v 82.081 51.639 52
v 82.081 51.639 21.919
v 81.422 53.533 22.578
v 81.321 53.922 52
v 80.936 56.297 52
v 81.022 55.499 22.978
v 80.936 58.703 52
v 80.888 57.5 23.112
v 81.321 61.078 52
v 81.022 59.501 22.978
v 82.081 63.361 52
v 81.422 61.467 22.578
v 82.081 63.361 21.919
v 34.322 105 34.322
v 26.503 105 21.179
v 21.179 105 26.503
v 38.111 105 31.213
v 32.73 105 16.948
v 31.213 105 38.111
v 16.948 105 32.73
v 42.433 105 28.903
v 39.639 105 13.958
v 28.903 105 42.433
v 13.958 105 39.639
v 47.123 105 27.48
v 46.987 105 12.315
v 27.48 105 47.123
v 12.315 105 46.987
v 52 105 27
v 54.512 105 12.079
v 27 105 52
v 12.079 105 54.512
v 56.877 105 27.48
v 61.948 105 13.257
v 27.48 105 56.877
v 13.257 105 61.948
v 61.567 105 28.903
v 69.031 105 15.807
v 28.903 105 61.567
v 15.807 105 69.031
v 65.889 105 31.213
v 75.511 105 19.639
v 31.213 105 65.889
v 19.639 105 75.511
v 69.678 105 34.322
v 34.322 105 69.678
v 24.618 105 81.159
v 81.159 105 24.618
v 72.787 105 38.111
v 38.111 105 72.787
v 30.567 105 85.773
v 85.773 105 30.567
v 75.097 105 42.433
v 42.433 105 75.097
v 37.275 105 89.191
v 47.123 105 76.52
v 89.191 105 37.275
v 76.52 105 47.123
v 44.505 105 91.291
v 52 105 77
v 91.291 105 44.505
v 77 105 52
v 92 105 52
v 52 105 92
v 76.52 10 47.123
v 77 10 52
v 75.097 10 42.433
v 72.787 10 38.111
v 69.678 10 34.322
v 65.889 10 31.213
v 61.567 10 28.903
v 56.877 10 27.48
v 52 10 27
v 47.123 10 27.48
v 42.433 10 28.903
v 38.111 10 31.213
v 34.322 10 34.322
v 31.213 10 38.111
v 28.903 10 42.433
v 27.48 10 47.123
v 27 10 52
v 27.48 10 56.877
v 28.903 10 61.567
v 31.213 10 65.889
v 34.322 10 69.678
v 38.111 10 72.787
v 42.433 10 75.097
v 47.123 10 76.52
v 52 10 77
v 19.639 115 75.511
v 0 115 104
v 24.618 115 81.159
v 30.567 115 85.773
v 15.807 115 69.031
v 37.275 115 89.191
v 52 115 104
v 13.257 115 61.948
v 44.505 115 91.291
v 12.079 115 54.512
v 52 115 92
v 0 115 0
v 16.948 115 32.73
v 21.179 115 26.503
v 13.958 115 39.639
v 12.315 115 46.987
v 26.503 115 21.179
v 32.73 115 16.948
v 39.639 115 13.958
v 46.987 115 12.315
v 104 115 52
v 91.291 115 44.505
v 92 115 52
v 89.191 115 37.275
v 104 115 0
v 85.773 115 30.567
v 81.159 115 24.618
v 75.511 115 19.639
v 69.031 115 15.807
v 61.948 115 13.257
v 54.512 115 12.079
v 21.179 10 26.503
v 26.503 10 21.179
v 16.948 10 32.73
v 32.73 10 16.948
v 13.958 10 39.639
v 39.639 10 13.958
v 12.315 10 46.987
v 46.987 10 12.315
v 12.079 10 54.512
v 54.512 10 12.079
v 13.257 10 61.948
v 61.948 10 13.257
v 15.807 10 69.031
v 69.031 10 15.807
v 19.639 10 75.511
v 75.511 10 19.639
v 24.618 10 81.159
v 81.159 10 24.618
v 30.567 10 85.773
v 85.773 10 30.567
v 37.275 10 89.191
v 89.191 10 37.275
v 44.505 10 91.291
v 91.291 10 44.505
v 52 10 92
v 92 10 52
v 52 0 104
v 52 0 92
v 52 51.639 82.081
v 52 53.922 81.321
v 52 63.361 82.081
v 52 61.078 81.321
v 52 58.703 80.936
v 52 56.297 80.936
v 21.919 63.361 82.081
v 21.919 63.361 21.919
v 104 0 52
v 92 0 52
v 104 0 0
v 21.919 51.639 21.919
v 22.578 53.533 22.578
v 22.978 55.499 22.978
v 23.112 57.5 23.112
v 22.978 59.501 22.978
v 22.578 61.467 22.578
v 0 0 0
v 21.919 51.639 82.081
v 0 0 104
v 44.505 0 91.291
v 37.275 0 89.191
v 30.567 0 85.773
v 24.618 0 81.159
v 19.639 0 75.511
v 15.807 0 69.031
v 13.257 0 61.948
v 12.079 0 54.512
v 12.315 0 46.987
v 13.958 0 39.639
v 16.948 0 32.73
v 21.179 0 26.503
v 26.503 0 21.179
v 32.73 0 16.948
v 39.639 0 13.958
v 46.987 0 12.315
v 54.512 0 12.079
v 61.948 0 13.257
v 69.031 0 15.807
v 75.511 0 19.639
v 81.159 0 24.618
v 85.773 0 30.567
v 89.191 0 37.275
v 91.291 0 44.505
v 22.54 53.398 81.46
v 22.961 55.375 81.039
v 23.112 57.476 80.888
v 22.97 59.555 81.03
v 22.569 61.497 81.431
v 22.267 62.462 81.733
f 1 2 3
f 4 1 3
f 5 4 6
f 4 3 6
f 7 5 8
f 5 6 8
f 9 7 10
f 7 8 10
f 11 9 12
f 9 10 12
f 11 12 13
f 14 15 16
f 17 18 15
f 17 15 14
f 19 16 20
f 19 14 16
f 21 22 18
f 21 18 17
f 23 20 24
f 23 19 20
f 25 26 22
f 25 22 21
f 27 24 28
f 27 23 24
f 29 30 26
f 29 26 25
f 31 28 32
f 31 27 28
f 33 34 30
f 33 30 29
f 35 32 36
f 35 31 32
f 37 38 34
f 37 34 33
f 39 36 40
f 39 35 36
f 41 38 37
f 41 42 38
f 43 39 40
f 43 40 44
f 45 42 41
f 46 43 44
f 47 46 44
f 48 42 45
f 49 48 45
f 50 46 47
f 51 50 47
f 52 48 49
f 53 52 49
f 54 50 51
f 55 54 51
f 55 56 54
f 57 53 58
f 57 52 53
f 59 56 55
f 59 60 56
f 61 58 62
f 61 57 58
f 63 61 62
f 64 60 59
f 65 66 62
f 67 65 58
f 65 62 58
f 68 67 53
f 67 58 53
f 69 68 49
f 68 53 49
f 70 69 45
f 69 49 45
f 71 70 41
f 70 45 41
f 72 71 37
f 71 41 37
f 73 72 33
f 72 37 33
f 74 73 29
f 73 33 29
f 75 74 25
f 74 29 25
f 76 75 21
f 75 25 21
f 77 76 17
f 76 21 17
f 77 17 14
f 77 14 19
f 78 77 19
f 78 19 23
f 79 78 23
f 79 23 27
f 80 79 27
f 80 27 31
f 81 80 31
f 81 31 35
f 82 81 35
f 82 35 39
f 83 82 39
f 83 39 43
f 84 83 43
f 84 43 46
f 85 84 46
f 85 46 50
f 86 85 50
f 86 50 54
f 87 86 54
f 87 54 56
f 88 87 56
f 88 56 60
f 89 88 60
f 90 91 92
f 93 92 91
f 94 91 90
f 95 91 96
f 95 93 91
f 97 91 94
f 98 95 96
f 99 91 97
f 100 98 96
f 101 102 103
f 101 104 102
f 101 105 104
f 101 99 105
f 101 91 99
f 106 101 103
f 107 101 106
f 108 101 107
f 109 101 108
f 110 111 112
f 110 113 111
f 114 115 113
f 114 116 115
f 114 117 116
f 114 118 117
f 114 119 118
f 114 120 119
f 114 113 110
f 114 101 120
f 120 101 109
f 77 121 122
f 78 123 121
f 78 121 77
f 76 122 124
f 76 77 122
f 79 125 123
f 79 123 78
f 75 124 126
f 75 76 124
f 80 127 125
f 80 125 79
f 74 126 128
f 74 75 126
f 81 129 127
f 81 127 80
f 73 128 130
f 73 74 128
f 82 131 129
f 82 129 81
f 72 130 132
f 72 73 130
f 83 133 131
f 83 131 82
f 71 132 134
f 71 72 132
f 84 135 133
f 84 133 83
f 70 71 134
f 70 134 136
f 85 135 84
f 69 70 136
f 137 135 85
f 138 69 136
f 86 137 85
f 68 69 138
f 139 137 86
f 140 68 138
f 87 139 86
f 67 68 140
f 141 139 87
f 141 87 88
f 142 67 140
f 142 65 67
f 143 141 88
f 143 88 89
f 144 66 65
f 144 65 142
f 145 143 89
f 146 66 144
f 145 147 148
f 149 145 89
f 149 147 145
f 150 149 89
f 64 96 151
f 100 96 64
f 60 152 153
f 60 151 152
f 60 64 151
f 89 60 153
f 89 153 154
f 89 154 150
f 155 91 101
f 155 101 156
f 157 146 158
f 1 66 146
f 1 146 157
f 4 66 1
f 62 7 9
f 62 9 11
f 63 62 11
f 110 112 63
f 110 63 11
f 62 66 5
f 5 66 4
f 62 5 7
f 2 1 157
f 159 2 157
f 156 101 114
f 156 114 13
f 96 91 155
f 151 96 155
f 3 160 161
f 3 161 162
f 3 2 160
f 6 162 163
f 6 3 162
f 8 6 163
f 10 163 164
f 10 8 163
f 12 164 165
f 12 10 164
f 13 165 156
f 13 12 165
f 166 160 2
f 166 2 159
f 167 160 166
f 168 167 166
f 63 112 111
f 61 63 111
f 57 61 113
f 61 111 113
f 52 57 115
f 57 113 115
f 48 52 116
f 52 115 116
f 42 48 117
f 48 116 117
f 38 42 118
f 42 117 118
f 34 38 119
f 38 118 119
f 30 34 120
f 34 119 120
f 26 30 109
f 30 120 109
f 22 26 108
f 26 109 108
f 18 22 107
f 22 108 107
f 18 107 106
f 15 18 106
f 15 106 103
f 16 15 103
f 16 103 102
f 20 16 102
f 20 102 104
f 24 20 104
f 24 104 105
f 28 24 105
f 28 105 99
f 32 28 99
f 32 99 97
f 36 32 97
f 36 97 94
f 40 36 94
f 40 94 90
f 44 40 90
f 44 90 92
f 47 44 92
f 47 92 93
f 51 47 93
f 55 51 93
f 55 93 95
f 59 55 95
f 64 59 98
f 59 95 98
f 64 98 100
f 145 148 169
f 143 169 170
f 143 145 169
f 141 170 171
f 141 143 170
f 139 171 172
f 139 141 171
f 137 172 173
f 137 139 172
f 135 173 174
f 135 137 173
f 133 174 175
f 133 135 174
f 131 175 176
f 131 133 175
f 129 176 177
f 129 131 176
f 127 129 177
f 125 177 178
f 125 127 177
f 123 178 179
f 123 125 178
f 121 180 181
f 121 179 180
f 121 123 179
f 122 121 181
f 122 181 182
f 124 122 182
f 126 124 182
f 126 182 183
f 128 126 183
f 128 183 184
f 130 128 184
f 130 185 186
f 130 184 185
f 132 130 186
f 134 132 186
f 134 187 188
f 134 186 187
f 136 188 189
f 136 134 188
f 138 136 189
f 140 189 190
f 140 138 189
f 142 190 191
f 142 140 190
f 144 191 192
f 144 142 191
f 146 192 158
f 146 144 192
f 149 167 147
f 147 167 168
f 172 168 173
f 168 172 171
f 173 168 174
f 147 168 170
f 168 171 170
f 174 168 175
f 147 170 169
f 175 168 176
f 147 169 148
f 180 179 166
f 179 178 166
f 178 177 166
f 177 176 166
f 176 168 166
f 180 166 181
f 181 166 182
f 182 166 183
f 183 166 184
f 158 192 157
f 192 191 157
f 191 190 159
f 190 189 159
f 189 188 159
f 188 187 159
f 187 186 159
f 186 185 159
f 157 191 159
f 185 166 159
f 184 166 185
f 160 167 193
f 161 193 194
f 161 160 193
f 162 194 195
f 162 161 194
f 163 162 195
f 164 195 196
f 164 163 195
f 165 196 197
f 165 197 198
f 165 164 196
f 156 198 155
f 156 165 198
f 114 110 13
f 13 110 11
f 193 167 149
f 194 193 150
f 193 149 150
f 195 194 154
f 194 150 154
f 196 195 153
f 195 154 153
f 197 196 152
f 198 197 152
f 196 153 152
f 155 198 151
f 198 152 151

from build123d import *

# Parameters (mm, degrees)
SKETCH2_W               = 104
SKETCH2_H               = 115
BOSS_EXTRUDE1_DEPTH     = 104
CUT_EXTRUDE1_DEPTH      = 187.70029459
CUT_EXTRUDE2_DEPTH      = 187.70029459
SKETCH5_R               = 25
CUT_EXTRUDE3_DEPTH      = 187.70029459
SKETCH7_R               = 40
CUT_EXTRUDE4_DEPTH      = 10
FILLET1_R               = 15
SKETCH8_W               = 52
SKETCH8_H               = 52
CUT_EXTRUDE5_DEPTH      = 187.70029459
CUT_EXTRUDE6_DEPTH      = 187.70029459
CUT_EXTRUDE6_DEPTH_BACK = 10


with BuildPart() as part:
    # Sketch2 → Boss-Extrude1 (new body)
    with BuildSketch(Plane.XY):
        with Locations((52, 57.5)):
            Rectangle(SKETCH2_W, SKETCH2_H)
    extrude(amount=BOSS_EXTRUDE1_DEPTH)

    # Sketch3 → Cut-Extrude1 (cut, through all)
    with BuildSketch(Plane.XY.offset(104)):
        Polygon((0, 115), (24.407301932, 57.5), (0, 0), align=None)
        Polygon((104, 115), (79.592698068, 57.5), (104, 0), align=None)
    extrude(amount=-CUT_EXTRUDE1_DEPTH, mode=Mode.SUBTRACT)

    # Sketch4 → Cut-Extrude2 (cut, through all)
    with BuildSketch(Plane(origin=(0, 0, 0), x_dir=(0, 0, -1), z_dir=(1, 0, 0))):
        Polygon((-104, 115), (-79.592698068, 57.5), (-104, 0), align=None)
        Polygon((0, 115), (-24.407301932, 57.5), (0, 0), align=None)
    extrude(amount=CUT_EXTRUDE2_DEPTH, mode=Mode.SUBTRACT)

    # Sketch5 → Cut-Extrude3 (cut, through all)
    with BuildSketch(Plane(origin=(0, 115, 0), x_dir=(1, 0, 0), z_dir=(0, 1, 0))):
        with Locations(Location((52, -52, 0), (0, 0, 270))):
            Circle(SKETCH5_R)
    extrude(amount=-CUT_EXTRUDE3_DEPTH, mode=Mode.SUBTRACT)

    # Sketch7 → Cut-Extrude4 (cut)
    with BuildSketch(Plane(origin=(0, 115, 0), x_dir=(1, 0, 0), z_dir=(0, 1, 0))):
        with Locations(Location((52, -52, 0), (0, 0, 270))):
            Circle(SKETCH7_R)
    extrude(amount=-CUT_EXTRUDE4_DEPTH, mode=Mode.SUBTRACT)

    # Fillet1
    fillet1_edges = [part.edges().sort_by_distance(p)[0] for p in [
        (24.407301932, 57.5, 52),
        (79.592698068, 57.5, 52),
        (52, 57.5, 79.592698068),
        (52, 57.5, 24.407301932),
    ]]
    fillet(fillet1_edges, radius=FILLET1_R)

    # Sketch8 → Cut-Extrude5 (cut, through all)
    with BuildSketch(Plane(origin=(0, 115, 0), x_dir=(1, 0, 0), z_dir=(0, 1, 0))):
        with Locations((78, -78)):
            Rectangle(SKETCH8_W, SKETCH8_H)
    extrude(amount=-CUT_EXTRUDE5_DEPTH, mode=Mode.SUBTRACT)

    # Sketch9 → Cut-Extrude6 (cut, two sides: drawn at the far end of the back side and taken through both)
    with BuildSketch(Plane.XZ.offset(-CUT_EXTRUDE6_DEPTH_BACK)):
        with BuildLine():
            Line((52, 77), (52, 92))
            ThreePointArc((52, 92), (23.715728753, 23.715728753), (92, 52))
            Line((92, 52), (77, 52))
            ThreePointArc((77, 52), (34.32233047, 34.32233047), (52, 77))
        make_face()
    extrude(amount=CUT_EXTRUDE6_DEPTH + CUT_EXTRUDE6_DEPTH_BACK, mode=Mode.SUBTRACT)


solid = part.part
